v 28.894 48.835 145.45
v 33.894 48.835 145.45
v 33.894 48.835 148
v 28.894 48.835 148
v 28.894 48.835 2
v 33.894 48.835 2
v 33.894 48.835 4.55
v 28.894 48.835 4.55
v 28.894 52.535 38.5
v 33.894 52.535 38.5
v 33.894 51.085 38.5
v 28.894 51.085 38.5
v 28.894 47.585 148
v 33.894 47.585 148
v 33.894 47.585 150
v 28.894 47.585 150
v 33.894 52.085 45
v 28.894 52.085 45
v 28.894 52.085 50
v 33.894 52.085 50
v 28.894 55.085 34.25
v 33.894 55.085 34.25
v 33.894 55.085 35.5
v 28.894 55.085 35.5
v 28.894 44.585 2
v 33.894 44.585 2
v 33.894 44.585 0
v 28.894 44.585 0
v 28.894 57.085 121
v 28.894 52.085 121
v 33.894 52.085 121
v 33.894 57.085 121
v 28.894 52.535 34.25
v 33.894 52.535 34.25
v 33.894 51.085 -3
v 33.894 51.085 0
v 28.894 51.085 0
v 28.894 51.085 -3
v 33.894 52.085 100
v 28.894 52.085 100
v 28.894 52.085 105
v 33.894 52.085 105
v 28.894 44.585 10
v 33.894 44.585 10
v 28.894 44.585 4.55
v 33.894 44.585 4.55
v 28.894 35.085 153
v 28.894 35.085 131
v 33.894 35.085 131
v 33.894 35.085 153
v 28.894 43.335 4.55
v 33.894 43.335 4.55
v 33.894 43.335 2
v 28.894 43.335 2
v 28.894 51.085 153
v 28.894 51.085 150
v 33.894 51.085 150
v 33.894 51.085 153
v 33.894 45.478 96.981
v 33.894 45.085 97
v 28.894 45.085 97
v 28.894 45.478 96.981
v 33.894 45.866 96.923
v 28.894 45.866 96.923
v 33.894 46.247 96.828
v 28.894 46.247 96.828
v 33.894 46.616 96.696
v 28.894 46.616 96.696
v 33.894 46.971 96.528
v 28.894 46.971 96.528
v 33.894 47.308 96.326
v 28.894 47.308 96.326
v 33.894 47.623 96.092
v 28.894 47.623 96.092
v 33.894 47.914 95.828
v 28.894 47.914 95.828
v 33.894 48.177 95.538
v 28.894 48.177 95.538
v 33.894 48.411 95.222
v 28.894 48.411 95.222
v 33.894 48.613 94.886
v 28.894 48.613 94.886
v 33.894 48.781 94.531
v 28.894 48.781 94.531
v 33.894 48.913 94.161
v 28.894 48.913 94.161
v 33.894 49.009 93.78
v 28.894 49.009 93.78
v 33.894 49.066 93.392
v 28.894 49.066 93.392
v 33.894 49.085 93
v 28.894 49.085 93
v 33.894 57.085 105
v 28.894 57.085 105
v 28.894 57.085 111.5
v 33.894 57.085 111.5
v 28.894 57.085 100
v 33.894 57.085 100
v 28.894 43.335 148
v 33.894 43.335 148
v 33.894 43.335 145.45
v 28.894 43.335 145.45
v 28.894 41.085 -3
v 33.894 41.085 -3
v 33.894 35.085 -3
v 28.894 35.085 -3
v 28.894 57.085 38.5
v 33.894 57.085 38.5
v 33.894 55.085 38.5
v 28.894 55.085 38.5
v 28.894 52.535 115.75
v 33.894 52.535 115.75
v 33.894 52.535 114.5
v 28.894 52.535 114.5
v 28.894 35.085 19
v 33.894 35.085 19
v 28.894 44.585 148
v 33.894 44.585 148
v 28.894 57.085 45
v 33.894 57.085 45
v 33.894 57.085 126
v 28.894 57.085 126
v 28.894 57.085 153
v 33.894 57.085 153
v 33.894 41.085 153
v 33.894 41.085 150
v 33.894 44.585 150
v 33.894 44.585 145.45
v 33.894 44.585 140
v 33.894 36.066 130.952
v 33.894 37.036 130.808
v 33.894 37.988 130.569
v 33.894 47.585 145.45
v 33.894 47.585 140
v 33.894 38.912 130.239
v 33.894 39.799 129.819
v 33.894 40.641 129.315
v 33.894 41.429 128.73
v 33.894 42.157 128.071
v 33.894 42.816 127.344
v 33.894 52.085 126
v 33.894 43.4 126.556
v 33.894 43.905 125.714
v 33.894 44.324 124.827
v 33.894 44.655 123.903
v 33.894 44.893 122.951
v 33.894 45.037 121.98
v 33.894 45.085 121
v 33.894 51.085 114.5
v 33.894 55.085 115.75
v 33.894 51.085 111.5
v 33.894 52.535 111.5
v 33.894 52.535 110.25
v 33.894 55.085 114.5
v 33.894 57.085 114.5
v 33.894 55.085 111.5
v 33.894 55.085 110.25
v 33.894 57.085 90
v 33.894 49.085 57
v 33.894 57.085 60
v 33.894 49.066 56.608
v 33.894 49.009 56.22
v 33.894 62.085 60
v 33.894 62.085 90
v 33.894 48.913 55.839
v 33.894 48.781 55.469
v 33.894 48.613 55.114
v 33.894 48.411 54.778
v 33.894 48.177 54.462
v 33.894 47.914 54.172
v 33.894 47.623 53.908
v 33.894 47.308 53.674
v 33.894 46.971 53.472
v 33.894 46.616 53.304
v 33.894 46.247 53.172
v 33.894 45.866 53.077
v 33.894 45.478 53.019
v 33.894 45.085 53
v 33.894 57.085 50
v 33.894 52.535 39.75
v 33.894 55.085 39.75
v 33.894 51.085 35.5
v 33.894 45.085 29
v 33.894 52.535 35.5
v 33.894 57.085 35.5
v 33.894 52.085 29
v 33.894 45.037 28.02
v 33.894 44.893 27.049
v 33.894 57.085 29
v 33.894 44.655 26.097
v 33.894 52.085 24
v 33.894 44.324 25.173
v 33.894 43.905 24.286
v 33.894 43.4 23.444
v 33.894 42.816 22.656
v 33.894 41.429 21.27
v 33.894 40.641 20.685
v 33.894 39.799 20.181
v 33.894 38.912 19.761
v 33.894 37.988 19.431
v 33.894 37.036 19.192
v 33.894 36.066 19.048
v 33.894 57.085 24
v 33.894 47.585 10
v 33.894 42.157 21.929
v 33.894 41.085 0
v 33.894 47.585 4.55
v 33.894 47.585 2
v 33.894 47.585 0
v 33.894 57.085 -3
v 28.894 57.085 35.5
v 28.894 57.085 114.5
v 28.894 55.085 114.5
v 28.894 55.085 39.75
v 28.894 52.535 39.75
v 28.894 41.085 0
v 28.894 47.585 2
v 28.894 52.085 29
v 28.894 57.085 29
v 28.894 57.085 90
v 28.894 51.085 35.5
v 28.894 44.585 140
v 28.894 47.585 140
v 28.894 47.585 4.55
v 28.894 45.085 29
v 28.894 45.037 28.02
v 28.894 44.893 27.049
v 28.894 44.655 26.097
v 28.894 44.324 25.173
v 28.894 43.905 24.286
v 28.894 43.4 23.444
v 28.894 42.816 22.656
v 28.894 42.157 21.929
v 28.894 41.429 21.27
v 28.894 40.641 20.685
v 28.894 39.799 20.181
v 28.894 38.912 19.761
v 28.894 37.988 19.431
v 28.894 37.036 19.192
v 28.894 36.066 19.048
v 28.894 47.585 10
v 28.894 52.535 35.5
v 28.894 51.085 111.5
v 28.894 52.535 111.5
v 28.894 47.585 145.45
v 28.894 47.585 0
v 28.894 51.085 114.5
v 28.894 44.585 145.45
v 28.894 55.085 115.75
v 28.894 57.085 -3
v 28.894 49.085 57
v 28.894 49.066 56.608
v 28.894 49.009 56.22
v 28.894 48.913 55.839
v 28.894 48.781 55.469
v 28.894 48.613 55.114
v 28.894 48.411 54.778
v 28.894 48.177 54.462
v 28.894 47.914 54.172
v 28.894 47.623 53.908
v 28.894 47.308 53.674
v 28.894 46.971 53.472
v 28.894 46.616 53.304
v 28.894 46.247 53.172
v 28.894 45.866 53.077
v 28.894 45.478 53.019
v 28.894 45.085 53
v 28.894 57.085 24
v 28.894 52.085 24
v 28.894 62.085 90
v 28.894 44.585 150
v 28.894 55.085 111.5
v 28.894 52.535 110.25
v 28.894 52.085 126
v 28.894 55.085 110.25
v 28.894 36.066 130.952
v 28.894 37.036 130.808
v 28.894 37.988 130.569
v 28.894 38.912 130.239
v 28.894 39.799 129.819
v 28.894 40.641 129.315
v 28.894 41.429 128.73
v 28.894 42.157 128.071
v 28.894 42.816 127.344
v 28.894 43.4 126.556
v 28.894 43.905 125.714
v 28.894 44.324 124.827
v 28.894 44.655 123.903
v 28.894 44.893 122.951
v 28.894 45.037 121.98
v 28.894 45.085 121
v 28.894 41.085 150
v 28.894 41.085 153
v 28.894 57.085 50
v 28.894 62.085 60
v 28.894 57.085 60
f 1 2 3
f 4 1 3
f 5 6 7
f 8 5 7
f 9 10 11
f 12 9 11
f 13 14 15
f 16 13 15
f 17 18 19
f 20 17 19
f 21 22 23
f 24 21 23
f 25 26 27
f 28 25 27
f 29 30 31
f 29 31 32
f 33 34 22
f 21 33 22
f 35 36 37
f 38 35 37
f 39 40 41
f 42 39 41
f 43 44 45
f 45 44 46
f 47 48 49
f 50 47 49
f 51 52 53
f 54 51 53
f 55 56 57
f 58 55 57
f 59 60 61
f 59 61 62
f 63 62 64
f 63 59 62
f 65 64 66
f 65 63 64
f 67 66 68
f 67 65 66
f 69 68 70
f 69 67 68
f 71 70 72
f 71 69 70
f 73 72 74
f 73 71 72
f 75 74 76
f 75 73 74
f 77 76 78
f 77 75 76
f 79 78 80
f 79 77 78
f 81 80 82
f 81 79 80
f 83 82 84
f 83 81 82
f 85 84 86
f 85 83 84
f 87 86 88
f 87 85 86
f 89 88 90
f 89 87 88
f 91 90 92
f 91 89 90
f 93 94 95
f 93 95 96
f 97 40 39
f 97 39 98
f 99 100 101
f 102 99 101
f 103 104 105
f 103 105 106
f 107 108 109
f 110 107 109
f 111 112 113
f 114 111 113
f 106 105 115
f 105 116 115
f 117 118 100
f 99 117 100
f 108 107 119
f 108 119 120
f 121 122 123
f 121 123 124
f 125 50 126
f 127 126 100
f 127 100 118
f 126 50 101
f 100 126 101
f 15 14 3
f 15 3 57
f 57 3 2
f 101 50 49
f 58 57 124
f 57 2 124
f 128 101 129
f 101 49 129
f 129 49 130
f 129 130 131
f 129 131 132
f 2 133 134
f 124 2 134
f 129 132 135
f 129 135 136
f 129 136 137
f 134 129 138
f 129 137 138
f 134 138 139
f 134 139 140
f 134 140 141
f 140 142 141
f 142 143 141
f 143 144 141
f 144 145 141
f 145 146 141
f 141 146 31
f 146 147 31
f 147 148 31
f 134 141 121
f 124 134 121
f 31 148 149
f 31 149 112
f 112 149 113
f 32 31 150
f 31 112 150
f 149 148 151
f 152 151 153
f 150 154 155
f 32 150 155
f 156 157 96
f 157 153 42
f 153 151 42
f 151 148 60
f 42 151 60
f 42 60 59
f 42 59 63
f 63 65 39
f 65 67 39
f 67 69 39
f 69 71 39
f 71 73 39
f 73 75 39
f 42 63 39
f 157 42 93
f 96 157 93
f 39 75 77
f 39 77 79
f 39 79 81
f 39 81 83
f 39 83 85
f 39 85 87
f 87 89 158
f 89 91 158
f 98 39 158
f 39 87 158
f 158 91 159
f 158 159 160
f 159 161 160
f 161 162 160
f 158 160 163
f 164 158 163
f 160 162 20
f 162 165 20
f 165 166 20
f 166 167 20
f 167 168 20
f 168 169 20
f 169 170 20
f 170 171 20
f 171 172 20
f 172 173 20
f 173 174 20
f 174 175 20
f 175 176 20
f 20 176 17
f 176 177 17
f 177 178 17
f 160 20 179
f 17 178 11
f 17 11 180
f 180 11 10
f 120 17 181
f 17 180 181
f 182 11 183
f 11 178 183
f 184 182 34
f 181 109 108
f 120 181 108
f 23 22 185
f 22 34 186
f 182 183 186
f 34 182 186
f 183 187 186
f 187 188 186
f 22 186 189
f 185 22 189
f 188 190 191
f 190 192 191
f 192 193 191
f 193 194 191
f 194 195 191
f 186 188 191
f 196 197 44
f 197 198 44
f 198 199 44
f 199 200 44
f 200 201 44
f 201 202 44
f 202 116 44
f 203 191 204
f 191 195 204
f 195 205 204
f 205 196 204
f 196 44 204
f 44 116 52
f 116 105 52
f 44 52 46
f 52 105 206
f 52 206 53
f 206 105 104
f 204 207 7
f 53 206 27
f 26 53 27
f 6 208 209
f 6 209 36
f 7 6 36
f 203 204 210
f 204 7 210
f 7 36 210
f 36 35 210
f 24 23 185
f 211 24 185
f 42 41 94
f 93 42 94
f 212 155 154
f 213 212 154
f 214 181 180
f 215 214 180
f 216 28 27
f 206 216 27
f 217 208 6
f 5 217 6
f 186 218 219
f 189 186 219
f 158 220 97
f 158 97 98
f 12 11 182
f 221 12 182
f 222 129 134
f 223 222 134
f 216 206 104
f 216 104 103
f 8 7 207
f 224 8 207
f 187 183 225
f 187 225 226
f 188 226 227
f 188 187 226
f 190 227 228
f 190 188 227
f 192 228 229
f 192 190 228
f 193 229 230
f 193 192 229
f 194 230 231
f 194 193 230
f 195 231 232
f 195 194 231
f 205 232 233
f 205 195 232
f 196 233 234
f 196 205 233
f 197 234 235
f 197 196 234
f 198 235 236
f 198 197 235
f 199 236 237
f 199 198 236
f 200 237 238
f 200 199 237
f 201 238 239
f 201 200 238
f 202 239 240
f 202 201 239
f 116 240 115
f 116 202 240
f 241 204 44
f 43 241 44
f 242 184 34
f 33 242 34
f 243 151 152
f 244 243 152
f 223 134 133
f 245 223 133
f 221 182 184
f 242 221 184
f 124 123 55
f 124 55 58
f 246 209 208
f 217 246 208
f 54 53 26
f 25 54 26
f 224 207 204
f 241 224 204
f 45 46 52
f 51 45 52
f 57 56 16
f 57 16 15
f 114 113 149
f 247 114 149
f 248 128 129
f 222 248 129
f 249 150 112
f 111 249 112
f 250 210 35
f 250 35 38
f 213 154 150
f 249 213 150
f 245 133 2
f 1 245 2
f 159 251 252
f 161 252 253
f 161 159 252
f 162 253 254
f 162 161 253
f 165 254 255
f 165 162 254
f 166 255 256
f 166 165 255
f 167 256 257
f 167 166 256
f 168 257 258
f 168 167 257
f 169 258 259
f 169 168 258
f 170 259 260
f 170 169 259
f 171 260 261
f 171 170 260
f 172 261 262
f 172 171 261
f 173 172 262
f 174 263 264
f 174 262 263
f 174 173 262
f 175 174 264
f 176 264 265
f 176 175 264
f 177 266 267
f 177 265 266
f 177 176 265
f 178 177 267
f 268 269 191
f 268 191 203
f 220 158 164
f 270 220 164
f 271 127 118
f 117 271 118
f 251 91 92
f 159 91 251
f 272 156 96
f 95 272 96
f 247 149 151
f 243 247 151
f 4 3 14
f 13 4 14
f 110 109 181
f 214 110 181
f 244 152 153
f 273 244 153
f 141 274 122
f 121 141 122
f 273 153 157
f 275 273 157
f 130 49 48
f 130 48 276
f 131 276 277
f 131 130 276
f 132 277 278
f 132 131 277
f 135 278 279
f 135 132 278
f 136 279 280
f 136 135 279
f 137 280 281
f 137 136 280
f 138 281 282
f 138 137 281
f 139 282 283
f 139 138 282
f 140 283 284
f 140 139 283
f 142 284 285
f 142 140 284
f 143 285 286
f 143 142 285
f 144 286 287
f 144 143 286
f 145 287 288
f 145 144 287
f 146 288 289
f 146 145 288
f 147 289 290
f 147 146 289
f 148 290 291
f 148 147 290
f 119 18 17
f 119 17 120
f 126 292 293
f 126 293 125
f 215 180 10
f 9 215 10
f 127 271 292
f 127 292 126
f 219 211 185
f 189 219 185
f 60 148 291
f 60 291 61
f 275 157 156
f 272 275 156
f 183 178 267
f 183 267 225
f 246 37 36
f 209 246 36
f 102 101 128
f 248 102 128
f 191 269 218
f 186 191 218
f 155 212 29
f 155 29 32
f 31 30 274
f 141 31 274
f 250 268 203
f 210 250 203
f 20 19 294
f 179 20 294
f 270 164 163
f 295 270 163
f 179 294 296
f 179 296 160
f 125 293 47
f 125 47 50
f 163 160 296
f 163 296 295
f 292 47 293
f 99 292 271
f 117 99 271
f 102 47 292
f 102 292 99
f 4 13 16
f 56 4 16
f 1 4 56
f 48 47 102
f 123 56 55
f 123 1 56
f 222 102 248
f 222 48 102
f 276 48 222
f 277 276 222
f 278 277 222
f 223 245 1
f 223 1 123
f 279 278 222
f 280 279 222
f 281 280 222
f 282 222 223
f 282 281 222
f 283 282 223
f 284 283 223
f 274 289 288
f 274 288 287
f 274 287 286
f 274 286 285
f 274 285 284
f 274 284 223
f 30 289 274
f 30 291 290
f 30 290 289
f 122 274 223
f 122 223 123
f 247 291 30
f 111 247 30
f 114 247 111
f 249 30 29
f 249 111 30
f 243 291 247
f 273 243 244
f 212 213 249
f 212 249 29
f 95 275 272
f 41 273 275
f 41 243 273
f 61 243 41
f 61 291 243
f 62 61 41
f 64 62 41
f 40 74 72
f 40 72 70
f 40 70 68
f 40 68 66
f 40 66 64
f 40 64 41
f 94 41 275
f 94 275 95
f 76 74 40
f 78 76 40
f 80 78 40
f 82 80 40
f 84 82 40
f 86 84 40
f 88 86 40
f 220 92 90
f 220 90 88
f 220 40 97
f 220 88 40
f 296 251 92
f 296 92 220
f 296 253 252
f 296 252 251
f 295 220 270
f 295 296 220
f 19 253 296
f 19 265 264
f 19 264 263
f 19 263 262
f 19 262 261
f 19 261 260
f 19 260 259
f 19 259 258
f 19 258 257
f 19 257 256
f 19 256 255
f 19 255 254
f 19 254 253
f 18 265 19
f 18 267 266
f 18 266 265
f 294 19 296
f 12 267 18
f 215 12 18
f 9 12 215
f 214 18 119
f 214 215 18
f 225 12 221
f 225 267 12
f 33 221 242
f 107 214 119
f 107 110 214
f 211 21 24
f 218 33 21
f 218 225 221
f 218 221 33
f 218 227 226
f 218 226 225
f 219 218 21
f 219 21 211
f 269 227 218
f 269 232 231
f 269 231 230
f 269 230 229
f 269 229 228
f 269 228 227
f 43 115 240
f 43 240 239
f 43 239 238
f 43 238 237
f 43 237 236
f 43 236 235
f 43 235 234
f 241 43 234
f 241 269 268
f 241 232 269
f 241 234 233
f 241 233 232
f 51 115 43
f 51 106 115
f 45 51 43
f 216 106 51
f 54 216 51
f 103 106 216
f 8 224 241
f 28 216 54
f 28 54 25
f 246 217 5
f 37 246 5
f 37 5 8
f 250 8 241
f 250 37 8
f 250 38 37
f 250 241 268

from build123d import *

# Parameters (mm, degrees)
SKETCH1_W           = 5
SKETCH1_H           = 22
BOSS_EXTRUDE1_DEPTH = 150
CUT_EXTRUDE1_DEPTH  = 161.573187019
CUT_EXTRUDE2_DEPTH  = 161.573187019
SKETCH4_W           = 5
SKETCH4_H           = 6
BOSS_EXTRUDE2_DEPTH = 3
SKETCH5_W           = 5
SKETCH5_H           = 6
BOSS_EXTRUDE3_DEPTH = 3
SKETCH6_W           = 30
SKETCH6_H           = 5
BOSS_EXTRUDE4_DEPTH = 5
SKETCH7_W           = 5
SKETCH7_H           = 5
CUT_EXTRUDE3_DEPTH  = 166.192623536
SKETCH8_W           = 5
SKETCH8_H           = 5
CUT_EXTRUDE4_DEPTH  = 166.192623536


with BuildPart() as part:
    # Sketch1 → Boss-Extrude1 (new body)
    with BuildSketch(Plane.XY):
        with Locations((31.394042166, 46.08544814)):
            Rectangle(SKETCH1_W, SKETCH1_H)
    extrude(amount=BOSS_EXTRUDE1_DEPTH)

    # Sketch2 → Cut-Extrude1 (cut, through all)
    with BuildSketch(Plane(origin=(33.894042166, 0, 0), x_dir=(0, 0, -1), z_dir=(1, 0, 0))):
        with BuildLine():
            Line((-93, 49.08544814), (-57, 49.08544814))
            ThreePointArc((-57, 49.08544814), (-54.171572875, 47.913875265), (-53, 45.08544814))
            Line((-53, 45.08544814), (-29, 45.08544814))
            ThreePointArc((-29, 45.08544814), (-21.928932188, 42.156515952), (-19, 35.08544814))
            Line((-19, 35.08544814), (-131, 35.08544814))
            ThreePointArc((-131, 35.08544814), (-128.071067812, 42.156515952), (-121, 45.08544814))
            Line((-121, 45.08544814), (-97, 45.08544814))
            ThreePointArc((-97, 45.08544814), (-95.828427125, 47.913875265), (-93, 49.08544814))
        make_face()
    extrude(amount=-CUT_EXTRUDE1_DEPTH, mode=Mode.SUBTRACT)

    # Sketch3 → Cut-Extrude2 (cut, through all)
    with BuildSketch(Plane(origin=(33.894042166, 0, 0), x_dir=(0, 0, -1), z_dir=(1, 0, 0))):
        Polygon((-38.5, 51.08544814), (-35.5, 51.08544814), (-35.5, 52.53544814), (-34.25, 52.53544814), (-34.25, 55.08544814), (-35.5, 55.08544814), (-35.5, 57.08544814), (-38.5, 57.08544814), (-38.5, 55.08544814), (-39.75, 55.08544814), (-39.75, 52.53544814), (-38.5, 52.53544814), align=None)
        Polygon((-111.5, 57.08544814), (-114.5, 57.08544814), (-114.5, 55.08544814), (-115.75, 55.08544814), (-115.75, 52.53544814), (-114.5, 52.53544814), (-114.5, 51.08544814), (-111.5, 51.08544814), (-111.5, 52.53544814), (-110.25, 52.53544814), (-110.25, 55.08544814), (-111.5, 55.08544814), align=None)
        Polygon((-10, 44.58544814), (-4.55, 44.58544814), (-4.55, 43.33544814), (-2, 43.33544814), (-2, 44.58544814), (0, 44.58544814), (0, 47.58544814), (-2, 47.58544814), (-2, 48.83544814), (-4.55, 48.83544814), (-4.55, 47.58544814), (-10, 47.58544814), align=None)
        Polygon((-145.45, 47.58544814), (-145.45, 48.83544814), (-148, 48.83544814), (-148, 47.58544814), (-150, 47.58544814), (-150, 44.58544814), (-148, 44.58544814), (-148, 43.33544814), (-145.45, 43.33544814), (-145.45, 44.58544814), (-140, 44.58544814), (-140, 47.58544814), align=None)
    extrude(amount=-CUT_EXTRUDE2_DEPTH, mode=Mode.SUBTRACT)

    # Sketch4 → Boss-Extrude2 (add)
    with BuildSketch(Plane(origin=(0, 0, 0), x_dir=(-1, 0, 0), z_dir=(0, 0, -1))):
        with Locations((-31.394042166, 38.08544814)):
            Rectangle(SKETCH4_W, SKETCH4_H)
        with Locations((-31.394042166, 54.08544814)):
            Rectangle(SKETCH4_W, SKETCH4_H)
    extrude(amount=BOSS_EXTRUDE2_DEPTH)

    # Sketch5 → Boss-Extrude3 (add)
    with BuildSketch(Plane.XY.offset(150)):
        with Locations((31.394042166, 54.08544814)):
            Rectangle(SKETCH5_W, SKETCH5_H)
        with Locations((31.394042166, 38.08544814)):
            Rectangle(SKETCH5_W, SKETCH5_H)
    extrude(amount=BOSS_EXTRUDE3_DEPTH)

    # Sketch6 → Boss-Extrude4 (add)
    with BuildSketch(Plane(origin=(33.894042166, 0, 0), x_dir=(0, 0, -1), z_dir=(1, 0, 0))):
        with Locations((-75, 59.58544814)):
            Rectangle(SKETCH6_W, SKETCH6_H)
    extrude(amount=-BOSS_EXTRUDE4_DEPTH)

    # Sketch7 → Cut-Extrude3 (cut, through all)
    with BuildSketch(Plane.ZY.offset(-28.894042166)):
        with Locations((123.5, 54.58544814)):
            Rectangle(SKETCH7_W, SKETCH7_H)
        with Locations((26.5, 54.58544814)):
            Rectangle(SKETCH7_W, SKETCH7_H)
    extrude(amount=-CUT_EXTRUDE3_DEPTH, mode=Mode.SUBTRACT)

    # Sketch8 → Cut-Extrude4 (cut, through all)
    with BuildSketch(Plane.ZY.offset(-28.894042166)):
        with Locations((47.5, 54.58544814)):
            Rectangle(SKETCH8_W, SKETCH8_H)
        with Locations((102.5, 54.58544814)):
            Rectangle(SKETCH8_W, SKETCH8_H)
    extrude(amount=-CUT_EXTRUDE4_DEPTH, mode=Mode.SUBTRACT)


solid = part.part
